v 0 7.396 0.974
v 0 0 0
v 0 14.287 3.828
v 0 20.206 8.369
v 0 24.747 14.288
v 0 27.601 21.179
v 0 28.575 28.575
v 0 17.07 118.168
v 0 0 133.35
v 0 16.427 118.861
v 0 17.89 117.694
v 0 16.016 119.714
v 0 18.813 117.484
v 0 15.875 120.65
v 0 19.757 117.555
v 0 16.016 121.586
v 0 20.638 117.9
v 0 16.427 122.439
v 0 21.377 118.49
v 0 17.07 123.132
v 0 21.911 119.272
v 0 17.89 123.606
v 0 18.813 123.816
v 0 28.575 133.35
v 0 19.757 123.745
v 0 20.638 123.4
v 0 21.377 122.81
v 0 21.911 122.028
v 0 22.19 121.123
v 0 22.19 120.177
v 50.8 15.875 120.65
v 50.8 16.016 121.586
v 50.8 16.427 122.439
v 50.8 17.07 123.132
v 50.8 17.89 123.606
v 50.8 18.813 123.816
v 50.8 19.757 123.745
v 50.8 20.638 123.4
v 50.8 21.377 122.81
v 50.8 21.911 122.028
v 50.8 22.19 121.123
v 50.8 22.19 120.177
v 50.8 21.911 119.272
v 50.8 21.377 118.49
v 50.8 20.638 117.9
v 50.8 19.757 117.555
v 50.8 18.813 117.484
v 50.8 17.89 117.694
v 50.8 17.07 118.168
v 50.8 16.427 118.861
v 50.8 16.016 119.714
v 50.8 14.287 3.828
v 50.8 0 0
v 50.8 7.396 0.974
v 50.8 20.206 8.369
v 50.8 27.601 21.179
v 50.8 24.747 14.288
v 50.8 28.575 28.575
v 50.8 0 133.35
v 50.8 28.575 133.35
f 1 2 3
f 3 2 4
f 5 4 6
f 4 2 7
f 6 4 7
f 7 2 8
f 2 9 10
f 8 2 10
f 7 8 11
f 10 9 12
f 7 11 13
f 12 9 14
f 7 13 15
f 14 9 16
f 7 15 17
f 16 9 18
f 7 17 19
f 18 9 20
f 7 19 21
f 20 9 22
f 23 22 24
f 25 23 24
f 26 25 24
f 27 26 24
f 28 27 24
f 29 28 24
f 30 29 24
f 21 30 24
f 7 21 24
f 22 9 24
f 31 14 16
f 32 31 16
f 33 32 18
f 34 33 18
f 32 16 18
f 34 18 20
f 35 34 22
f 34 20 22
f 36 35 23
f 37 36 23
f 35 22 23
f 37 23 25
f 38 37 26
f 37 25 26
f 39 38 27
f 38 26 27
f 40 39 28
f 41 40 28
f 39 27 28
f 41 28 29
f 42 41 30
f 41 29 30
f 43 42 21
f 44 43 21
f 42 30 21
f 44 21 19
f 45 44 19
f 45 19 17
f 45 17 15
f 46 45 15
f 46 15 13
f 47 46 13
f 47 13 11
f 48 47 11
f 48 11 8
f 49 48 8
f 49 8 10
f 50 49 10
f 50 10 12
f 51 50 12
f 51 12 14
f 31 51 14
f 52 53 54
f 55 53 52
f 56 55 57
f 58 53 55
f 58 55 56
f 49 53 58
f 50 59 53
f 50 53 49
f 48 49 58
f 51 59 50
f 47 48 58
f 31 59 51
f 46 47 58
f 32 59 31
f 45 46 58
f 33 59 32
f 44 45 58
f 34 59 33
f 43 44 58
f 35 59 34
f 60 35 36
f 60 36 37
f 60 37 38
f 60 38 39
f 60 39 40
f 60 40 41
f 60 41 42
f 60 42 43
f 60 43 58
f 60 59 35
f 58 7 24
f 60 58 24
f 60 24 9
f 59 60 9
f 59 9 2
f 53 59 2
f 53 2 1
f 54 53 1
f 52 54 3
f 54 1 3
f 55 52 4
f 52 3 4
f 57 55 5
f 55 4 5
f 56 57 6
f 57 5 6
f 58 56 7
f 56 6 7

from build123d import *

# Parameters (mm, degrees)
F1_DEPTH = 50.8
F3_D     = 6.35


with BuildPart() as f1:
    # F0 (on Right) → F1 (new body)
    with BuildSketch(Plane.YZ):
        with BuildLine():
            Line((0, 133.35), (0, 0))
            ThreePointArc((0, 0), (20.205576, 8.369424), (28.575, 28.575))
            Line((28.575, 28.575), (28.575, 133.35))
            Line((28.575, 133.35), (0, 133.35))
        make_face()
    extrude(amount=F1_DEPTH)

    # F3 (through all)
    with Locations(Plane.YZ.offset(50.8)):
        with Locations((19.05, 120.65)):
            Hole(F3_D / 2)


solid = f1.part
